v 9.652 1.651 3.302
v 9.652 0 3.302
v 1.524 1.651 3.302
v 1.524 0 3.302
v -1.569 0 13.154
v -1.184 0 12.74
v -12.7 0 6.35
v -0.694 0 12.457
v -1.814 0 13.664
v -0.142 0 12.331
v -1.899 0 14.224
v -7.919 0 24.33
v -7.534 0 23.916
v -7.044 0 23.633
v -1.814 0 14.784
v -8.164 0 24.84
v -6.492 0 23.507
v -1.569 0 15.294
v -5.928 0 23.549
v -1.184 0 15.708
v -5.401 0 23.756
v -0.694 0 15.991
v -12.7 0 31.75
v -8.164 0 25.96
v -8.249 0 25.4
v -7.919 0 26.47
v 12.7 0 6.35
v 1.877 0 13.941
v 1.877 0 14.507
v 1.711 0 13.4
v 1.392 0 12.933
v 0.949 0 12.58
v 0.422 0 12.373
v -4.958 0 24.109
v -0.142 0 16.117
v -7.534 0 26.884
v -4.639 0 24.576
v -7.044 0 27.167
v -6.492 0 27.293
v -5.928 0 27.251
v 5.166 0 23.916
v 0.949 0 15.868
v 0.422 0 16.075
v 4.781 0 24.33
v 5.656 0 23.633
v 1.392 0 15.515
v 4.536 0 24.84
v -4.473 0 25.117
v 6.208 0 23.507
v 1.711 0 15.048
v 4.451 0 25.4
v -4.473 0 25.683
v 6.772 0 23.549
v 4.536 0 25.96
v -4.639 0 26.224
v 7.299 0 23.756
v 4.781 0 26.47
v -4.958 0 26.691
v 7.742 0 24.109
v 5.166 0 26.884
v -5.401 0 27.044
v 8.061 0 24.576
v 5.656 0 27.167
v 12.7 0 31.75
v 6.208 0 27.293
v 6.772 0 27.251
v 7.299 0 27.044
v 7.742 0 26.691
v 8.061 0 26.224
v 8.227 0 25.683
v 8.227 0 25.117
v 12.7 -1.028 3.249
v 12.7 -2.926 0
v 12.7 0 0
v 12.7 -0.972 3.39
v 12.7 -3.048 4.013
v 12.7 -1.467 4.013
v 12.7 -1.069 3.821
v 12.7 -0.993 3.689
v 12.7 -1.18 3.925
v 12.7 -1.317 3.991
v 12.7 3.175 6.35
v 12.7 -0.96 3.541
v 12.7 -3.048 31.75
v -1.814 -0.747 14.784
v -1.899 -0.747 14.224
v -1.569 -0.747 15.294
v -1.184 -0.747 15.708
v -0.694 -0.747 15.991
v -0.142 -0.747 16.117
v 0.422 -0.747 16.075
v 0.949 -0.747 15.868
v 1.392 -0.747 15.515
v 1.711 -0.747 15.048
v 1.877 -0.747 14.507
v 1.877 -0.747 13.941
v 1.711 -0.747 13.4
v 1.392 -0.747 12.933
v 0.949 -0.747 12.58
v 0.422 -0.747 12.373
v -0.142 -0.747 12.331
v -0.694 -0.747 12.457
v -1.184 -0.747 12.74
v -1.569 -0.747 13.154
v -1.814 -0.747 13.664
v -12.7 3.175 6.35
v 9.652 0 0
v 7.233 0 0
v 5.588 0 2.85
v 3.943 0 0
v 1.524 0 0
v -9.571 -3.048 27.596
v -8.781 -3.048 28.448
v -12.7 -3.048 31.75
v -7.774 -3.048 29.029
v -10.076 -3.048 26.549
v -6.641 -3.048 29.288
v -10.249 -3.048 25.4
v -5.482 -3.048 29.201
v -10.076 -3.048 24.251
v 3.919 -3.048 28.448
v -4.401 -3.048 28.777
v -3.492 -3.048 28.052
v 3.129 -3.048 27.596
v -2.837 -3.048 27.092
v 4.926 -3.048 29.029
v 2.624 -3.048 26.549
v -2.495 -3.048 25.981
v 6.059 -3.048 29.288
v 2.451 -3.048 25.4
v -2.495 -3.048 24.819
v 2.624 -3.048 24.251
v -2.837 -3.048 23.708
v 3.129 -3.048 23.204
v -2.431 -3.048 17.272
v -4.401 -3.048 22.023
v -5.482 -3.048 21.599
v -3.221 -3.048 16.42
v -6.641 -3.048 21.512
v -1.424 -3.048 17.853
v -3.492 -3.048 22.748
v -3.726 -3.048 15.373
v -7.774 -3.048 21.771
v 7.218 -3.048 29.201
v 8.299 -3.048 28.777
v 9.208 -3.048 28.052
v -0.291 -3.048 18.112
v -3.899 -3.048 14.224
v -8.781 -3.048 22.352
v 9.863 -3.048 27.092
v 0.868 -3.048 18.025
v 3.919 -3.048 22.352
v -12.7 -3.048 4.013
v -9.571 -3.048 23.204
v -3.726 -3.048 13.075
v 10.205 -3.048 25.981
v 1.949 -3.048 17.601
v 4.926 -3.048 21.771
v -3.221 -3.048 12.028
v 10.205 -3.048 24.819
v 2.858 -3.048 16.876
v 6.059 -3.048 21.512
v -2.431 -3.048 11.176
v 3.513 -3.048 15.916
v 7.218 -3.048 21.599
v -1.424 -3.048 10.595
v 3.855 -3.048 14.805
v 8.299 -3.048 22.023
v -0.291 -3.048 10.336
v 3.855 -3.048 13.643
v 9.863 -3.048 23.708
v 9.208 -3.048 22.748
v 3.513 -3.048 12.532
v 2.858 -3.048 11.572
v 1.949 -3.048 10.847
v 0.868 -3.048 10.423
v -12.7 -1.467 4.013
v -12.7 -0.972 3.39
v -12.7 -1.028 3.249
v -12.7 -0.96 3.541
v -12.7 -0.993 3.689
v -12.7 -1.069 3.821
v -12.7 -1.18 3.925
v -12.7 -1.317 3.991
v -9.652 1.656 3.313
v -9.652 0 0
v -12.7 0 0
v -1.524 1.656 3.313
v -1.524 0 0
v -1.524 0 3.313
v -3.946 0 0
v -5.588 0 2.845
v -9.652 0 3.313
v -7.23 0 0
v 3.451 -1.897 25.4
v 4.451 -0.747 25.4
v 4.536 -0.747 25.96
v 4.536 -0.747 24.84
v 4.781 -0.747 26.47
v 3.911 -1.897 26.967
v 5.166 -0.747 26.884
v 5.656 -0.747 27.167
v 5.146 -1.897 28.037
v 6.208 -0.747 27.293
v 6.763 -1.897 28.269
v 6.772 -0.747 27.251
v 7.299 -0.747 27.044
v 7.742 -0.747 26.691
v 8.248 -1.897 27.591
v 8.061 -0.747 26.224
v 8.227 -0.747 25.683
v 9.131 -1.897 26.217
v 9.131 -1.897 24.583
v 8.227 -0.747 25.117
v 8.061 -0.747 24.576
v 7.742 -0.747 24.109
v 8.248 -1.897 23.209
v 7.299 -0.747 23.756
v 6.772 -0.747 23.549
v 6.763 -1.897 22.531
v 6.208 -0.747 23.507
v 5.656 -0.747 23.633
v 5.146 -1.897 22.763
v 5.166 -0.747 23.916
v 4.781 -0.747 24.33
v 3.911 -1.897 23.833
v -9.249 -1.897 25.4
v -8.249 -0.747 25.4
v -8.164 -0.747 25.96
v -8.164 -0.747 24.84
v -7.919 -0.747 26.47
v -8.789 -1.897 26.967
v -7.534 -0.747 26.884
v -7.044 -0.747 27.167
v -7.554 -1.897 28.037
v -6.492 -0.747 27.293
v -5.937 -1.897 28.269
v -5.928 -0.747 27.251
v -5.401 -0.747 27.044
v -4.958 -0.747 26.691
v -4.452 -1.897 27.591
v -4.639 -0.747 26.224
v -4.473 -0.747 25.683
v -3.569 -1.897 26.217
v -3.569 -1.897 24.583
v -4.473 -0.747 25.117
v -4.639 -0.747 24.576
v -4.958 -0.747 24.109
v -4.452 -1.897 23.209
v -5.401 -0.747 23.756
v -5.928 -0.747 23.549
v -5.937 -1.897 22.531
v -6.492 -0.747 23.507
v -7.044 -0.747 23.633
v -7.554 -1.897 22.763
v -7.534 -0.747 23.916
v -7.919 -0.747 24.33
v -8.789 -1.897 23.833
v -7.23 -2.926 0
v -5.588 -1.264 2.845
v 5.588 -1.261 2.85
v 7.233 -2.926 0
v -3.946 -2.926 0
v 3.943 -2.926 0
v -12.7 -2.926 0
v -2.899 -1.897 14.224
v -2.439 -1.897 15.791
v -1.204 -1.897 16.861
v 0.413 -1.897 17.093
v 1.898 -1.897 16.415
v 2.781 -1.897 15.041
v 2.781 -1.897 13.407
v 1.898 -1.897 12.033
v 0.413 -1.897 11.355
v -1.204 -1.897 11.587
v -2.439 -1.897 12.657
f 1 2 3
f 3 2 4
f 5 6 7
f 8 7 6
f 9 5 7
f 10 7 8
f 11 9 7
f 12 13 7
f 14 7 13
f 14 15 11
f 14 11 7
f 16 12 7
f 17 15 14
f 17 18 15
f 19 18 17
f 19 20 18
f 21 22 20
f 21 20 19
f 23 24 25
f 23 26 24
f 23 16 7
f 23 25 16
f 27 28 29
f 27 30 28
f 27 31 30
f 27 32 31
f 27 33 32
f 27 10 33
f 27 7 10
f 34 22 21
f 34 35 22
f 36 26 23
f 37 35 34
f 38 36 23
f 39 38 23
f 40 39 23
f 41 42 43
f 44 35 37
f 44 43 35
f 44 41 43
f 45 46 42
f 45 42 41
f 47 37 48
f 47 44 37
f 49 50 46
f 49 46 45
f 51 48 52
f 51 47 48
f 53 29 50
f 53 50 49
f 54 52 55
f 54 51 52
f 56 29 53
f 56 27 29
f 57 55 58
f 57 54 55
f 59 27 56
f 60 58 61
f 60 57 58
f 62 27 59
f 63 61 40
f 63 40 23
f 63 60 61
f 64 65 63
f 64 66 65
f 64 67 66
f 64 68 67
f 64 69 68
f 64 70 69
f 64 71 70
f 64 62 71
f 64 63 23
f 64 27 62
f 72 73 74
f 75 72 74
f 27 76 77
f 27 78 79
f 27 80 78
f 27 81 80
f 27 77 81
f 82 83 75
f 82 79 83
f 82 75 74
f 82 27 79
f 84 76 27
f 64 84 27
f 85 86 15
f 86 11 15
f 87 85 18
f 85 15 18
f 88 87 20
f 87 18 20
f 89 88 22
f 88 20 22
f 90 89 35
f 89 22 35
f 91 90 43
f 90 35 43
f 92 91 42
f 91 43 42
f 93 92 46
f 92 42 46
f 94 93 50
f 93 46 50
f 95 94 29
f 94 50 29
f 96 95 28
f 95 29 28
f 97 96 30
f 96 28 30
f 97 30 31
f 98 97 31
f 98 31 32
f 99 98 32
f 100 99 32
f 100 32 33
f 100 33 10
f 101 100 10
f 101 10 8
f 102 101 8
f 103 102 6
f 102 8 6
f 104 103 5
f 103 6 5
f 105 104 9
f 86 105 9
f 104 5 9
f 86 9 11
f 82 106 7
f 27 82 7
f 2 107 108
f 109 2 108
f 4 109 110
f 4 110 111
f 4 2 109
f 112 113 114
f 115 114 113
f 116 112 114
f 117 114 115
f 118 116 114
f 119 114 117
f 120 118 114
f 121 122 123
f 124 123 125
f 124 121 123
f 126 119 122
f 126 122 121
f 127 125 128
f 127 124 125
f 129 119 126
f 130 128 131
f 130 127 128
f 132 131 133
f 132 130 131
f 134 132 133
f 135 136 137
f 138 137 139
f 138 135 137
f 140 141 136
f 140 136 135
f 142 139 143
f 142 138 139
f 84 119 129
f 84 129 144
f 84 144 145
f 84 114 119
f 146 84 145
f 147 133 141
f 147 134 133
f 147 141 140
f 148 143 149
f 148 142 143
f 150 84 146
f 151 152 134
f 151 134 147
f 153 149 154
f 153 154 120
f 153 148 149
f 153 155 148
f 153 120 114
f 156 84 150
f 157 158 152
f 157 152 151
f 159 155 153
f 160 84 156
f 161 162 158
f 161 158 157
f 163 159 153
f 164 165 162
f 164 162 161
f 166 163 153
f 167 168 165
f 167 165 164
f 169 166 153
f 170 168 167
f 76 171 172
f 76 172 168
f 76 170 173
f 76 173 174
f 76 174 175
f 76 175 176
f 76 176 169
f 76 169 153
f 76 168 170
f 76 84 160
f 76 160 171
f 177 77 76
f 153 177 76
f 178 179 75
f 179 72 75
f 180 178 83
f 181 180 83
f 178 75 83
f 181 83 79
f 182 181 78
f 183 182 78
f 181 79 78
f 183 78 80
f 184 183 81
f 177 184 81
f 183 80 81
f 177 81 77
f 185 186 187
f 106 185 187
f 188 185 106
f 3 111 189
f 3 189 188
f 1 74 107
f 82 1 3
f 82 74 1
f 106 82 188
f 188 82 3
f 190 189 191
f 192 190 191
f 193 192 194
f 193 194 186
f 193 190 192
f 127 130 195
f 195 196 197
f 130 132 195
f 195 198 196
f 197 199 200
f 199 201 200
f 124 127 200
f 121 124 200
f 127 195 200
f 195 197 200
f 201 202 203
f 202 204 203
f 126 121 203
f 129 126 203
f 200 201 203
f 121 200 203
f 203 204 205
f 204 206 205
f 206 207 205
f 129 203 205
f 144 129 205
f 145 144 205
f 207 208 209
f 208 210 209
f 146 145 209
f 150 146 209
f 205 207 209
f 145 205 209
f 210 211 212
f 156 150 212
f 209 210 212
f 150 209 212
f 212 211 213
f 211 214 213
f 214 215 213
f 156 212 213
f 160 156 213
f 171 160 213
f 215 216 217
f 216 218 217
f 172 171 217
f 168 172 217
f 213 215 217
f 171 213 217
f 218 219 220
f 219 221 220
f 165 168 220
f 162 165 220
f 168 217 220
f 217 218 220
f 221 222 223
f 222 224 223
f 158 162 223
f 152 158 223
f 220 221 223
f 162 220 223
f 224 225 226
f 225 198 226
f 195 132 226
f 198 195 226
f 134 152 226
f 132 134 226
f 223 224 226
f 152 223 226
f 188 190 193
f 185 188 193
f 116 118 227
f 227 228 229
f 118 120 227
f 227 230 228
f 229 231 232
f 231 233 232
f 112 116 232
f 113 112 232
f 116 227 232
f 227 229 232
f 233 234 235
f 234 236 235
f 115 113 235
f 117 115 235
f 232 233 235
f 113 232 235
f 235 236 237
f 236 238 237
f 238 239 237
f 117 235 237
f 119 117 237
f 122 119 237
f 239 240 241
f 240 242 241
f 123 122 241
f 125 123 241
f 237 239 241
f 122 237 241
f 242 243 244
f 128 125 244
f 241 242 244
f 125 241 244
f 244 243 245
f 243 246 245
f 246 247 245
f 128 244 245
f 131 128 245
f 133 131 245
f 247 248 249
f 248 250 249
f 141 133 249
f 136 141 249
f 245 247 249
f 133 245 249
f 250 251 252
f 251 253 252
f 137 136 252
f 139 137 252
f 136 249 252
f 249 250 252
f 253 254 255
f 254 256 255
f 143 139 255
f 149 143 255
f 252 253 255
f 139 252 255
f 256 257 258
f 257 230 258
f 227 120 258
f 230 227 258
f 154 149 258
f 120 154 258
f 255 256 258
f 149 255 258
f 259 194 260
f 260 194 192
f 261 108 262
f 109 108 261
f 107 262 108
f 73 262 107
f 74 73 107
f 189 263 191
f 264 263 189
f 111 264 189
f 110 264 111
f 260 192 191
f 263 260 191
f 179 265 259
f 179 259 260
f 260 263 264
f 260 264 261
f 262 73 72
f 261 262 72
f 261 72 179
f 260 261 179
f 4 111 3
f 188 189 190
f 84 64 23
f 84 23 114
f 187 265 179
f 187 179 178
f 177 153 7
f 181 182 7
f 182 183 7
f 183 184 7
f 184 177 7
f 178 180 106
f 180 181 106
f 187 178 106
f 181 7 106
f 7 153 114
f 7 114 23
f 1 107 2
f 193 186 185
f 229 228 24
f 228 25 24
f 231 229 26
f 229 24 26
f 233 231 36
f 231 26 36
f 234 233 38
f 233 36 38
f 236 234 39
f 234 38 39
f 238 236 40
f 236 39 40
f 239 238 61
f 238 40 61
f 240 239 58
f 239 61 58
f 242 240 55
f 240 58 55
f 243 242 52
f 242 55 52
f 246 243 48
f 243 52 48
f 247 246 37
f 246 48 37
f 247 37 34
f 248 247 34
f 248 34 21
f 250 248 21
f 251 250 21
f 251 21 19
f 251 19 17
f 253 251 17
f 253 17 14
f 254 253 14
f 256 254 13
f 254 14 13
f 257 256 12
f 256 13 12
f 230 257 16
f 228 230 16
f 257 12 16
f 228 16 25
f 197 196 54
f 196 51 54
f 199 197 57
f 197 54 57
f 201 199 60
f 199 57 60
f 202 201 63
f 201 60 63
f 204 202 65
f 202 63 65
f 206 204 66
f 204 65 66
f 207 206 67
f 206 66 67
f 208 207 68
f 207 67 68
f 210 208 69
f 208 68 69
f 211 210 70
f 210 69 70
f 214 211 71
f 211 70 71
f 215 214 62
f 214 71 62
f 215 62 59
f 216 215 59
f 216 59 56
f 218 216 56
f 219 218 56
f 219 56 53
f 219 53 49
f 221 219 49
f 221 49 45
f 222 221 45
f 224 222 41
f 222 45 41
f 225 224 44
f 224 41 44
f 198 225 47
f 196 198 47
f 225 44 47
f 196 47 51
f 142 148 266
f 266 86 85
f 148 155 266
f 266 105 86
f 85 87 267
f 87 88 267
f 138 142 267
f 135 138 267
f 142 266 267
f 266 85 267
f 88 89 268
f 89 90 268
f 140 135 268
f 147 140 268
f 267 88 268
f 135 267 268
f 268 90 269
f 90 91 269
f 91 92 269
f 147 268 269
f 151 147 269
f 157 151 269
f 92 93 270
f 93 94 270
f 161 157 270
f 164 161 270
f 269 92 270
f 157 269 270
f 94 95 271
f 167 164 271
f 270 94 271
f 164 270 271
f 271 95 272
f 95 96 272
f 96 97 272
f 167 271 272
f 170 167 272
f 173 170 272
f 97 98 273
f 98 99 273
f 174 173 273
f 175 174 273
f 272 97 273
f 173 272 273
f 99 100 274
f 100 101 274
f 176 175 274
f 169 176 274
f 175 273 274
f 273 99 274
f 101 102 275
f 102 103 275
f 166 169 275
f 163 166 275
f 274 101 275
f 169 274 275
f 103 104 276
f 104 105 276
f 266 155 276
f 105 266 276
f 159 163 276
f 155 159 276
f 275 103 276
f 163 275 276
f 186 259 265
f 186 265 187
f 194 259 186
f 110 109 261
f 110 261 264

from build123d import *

# Parameters (mm, degrees)
F1_DEPTH       = 12.7
F3_D           = 3.7973
F3_CSINK_D     = 7.7978
F3_CSINK_ANGLE = 82
F4_W           = 8.128
F4_H           = 9.6413786206
F4_H_2         = 9.652
F5_DEPTH       = 25.4
F7_DEPTH       = 12.7
F9_DEPTH       = 25.4
F11_DEPTH      = 25.4


with BuildPart() as f1:
    # F0 (on Right) → F1 (new body, symmetric)
    with BuildSketch(Plane.YZ):
        Polygon((0, 6.35), (0, 31.75), (-3.048, 31.75), (-3.048, 0), (0, 0), (3.175, 6.35), align=None)
    extrude(amount=F1_DEPTH, both=True)

    # F3 (through all)
    with Locations(Plane.XZ.offset(3.048)):
        with Locations((-6.35, 25.4), (6.35, 25.4), (0, 14.224)):
            CounterSinkHole(F3_D / 2, F3_CSINK_D / 2, counter_sink_angle=F3_CSINK_ANGLE)

    # F4 (on face) → F5 (cut)
    with BuildSketch(Plane(origin=(0, 0, 0), x_dir=(-1, 0, 0), z_dir=(0, 1, 0))):
        with Locations((-5.588, -1.5186893103)):
            Rectangle(F4_W, F4_H)
        with Locations((5.588, -1.5133786206)):
            Rectangle(F4_W, F4_H_2)
    extrude(amount=F5_DEPTH, mode=Mode.SUBTRACT)

    # F6 (on Right) → F7 (cut, symmetric)
    with BuildSketch(Plane.YZ):
        with BuildLine():
            Line((-1.4666680983, 4.0132), (-4.4497507624, 4.0132))
            Line((-4.4497507624, 4.0132), (-4.4497507624, 0))
            Line((-4.4497507624, 0), (-2.9257507624, 0))
            Line((-2.9257507624, 0), (-1.0280151601, 3.2489821244))
            ThreePointArc((-1.0280151601, 3.2489821244), (-1.0260874129, 3.7580886308), (-1.4666680983, 4.0132))
        make_face()
    extrude(amount=F7_DEPTH, both=True, mode=Mode.SUBTRACT)

    # F8 (on Front) → F9 (cut)
    with BuildSketch(Plane.XZ):
        Polygon((0.088738686, -6.674986371), (11.087261314, -6.674986371), (5.588, 2.850013629), align=None)
    extrude(amount=F9_DEPTH, mode=Mode.SUBTRACT)

    # F10 (on face) → F11 (cut)
    with BuildSketch(Plane(origin=(0, 0, 0), x_dir=(-1, 0, 0), z_dir=(0, 1, 0))):
        Polygon((0.088738686, -6.6802), (11.087261314, -6.6802), (5.588, 2.8448), align=None)
    extrude(amount=-F11_DEPTH, mode=Mode.SUBTRACT)


solid = f1.part
